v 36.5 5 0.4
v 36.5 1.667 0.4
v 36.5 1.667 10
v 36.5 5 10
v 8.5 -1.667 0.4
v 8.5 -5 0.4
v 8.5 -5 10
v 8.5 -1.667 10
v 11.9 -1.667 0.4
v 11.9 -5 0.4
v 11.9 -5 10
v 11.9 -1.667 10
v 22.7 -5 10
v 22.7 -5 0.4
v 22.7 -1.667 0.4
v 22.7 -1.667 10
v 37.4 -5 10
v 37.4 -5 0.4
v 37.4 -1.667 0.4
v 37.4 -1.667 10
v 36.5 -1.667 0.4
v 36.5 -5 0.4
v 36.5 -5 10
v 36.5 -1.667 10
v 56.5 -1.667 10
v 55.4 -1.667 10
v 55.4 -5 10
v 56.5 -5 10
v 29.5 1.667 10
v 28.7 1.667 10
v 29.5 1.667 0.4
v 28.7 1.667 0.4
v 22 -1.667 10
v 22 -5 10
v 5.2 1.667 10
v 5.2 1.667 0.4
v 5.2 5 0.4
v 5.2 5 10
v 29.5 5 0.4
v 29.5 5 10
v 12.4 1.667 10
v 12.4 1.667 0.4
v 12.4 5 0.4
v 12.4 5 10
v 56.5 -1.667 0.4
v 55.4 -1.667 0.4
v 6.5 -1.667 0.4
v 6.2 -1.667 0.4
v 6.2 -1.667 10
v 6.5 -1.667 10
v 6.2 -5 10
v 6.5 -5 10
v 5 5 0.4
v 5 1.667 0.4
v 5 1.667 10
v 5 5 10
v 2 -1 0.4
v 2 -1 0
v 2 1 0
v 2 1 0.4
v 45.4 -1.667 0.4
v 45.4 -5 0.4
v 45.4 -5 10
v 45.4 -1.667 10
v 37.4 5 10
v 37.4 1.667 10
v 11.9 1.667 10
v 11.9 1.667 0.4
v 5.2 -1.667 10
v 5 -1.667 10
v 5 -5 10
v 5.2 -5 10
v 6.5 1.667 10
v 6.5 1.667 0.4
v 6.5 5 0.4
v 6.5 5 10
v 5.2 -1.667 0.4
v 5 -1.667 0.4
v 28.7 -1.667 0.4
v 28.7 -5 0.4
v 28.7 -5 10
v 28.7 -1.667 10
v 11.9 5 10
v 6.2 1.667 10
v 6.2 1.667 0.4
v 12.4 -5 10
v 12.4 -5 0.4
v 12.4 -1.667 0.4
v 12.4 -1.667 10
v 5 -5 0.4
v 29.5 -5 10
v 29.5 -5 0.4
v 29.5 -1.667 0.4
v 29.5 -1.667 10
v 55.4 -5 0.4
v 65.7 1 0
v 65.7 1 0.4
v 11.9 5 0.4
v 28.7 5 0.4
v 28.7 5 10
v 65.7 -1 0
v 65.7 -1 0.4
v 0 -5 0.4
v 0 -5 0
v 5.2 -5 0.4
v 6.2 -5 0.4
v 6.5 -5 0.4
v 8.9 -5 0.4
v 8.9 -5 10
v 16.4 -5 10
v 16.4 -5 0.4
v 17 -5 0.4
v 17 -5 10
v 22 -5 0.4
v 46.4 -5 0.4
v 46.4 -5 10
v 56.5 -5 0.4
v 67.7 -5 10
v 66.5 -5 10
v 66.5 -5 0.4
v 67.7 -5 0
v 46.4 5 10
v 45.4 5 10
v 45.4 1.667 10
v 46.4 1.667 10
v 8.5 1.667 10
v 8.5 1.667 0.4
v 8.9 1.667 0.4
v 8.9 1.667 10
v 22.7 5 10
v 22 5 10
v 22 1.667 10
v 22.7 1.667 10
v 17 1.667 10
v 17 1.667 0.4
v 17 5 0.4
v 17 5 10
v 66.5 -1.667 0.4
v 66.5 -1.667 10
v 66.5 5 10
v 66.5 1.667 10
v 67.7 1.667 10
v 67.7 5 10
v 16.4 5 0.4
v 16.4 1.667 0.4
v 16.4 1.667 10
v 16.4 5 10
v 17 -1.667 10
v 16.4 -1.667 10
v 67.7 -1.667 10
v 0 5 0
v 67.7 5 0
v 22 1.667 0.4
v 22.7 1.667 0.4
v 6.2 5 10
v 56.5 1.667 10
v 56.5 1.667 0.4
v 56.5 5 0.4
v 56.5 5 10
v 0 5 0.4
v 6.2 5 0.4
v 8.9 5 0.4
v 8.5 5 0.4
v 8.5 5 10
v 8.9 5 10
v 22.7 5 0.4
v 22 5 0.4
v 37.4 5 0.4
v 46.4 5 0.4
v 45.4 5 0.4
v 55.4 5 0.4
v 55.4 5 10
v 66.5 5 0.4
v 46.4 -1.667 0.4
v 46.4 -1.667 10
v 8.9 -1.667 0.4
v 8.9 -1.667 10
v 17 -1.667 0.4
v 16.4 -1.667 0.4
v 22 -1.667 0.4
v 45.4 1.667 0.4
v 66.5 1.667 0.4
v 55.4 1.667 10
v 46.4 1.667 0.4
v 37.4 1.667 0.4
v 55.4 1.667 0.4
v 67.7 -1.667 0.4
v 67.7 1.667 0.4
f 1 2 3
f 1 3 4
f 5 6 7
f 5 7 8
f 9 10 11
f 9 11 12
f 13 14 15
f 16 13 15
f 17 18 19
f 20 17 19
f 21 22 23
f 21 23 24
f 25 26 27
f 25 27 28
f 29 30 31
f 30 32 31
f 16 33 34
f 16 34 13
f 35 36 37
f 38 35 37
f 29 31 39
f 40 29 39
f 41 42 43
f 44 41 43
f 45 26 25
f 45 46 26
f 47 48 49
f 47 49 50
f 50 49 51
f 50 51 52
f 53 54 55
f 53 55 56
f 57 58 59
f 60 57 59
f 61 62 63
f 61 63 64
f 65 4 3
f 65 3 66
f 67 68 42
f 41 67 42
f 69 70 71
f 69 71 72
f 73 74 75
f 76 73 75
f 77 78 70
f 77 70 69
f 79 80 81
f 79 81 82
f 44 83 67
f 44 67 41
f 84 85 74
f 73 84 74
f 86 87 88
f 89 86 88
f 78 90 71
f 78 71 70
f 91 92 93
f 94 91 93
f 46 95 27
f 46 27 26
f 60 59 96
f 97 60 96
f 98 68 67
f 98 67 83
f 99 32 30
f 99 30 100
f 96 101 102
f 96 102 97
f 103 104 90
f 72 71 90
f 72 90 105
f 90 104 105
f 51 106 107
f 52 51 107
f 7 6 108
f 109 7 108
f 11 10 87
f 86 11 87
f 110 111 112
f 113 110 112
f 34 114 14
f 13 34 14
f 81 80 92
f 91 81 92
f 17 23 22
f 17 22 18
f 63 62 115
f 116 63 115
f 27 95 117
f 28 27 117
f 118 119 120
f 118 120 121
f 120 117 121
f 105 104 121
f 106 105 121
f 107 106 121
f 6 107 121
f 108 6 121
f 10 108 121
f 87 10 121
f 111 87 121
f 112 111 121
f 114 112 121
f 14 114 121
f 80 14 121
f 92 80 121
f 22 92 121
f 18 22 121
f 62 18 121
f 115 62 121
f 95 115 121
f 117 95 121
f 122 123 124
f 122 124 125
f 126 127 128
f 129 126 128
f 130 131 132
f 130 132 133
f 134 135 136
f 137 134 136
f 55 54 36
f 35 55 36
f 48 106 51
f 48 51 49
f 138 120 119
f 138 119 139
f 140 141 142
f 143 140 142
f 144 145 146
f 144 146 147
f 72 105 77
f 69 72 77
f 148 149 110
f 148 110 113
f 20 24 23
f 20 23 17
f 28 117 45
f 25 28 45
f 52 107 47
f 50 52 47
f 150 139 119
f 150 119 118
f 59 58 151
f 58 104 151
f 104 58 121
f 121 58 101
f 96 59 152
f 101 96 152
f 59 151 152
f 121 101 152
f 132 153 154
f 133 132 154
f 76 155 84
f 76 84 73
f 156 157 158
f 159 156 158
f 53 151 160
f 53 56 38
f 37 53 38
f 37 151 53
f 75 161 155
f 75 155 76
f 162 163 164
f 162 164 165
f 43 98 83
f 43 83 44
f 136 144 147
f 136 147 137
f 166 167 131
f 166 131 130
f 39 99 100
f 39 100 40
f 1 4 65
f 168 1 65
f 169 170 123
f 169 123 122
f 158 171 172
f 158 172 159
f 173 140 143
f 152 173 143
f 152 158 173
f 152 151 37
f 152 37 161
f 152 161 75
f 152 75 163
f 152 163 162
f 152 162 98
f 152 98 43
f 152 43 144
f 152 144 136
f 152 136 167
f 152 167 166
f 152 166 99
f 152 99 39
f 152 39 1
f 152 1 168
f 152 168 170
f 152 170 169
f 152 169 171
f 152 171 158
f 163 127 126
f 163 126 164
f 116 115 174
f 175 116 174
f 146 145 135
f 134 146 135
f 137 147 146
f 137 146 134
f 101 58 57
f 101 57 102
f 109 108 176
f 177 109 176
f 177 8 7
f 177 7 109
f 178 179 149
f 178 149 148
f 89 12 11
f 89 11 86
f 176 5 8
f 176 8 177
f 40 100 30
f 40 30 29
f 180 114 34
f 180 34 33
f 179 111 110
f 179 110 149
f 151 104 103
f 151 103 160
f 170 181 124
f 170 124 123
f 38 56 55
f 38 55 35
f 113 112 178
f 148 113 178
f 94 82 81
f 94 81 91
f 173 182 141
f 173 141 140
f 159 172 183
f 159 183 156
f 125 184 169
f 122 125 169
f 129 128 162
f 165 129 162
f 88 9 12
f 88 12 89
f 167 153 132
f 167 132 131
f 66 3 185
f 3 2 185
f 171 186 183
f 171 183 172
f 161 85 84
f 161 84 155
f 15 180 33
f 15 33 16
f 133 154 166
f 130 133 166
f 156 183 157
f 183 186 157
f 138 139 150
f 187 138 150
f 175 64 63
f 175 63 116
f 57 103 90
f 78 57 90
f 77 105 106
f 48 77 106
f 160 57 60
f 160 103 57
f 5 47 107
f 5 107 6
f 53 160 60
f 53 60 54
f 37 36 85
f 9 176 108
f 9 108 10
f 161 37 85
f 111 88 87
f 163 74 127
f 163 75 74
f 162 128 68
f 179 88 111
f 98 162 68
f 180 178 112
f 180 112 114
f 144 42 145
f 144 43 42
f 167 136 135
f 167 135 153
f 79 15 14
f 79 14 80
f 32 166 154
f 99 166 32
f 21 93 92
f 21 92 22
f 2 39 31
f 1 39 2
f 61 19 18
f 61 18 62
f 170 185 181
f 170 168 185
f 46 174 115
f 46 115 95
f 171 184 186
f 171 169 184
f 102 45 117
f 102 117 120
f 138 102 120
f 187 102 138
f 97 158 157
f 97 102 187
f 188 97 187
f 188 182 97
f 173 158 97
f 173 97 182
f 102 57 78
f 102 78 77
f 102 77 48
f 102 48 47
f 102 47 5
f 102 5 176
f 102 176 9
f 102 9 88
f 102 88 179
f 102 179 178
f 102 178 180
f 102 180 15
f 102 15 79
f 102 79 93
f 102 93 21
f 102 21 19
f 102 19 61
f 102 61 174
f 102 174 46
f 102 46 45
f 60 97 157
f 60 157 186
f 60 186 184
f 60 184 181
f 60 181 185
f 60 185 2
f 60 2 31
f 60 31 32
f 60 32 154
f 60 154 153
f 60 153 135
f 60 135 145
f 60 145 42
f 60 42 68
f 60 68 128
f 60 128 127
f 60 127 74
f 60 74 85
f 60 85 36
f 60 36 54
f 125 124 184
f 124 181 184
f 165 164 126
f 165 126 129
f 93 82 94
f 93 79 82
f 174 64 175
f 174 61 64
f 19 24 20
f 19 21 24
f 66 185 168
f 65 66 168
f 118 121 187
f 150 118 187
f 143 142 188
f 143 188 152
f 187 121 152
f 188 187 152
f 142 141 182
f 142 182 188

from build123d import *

# Parameters (mm, degrees)
F0_W     = 0.2
F0_H     = 10
F0_W_2   = 0.3
F0_W_3   = 0.4
F0_W_4   = 0.5
F0_W_5   = 0.6
F0_W_6   = 0.7
F0_W_7   = 0.8
F0_W_8   = 0.9
F0_W_9   = 1
F0_W_10  = 1.1
F0_W_11  = 1.2
F1_DEPTH = 10
F2_W     = 67.7
F2_H     = 3.33333
F3_DEPTH = 10.001
F4_W     = 67.7
F4_H     = 10
F4_W_2   = 63.7
F4_H_2   = 2
F5_DEPTH = 0.4


with BuildPart() as f1:
    # F0 (on Top) → F1 (new body)
    with BuildSketch(Plane.XY):
        with Locations((5.1, 0)):
            Rectangle(F0_W, F0_H)
        with Locations((6.35, 0)):
            Rectangle(F0_W_2, F0_H)
        with Locations((8.7, 0)):
            Rectangle(F0_W_3, F0_H)
        with Locations((12.15, 0)):
            Rectangle(F0_W_4, F0_H)
        with Locations((16.7, 0)):
            Rectangle(F0_W_5, F0_H)
        with Locations((22.35, 0)):
            Rectangle(F0_W_6, F0_H)
        with Locations((29.1, 0)):
            Rectangle(F0_W_7, F0_H)
        with Locations((36.95, 0)):
            Rectangle(F0_W_8, F0_H)
        with Locations((45.9, 0)):
            Rectangle(F0_W_9, F0_H)
        with Locations((55.95, 0)):
            Rectangle(F0_W_10, F0_H)
        with Locations((67.1, 0)):
            Rectangle(F0_W_11, F0_H)
    extrude(amount=F1_DEPTH)

    # F2 (on Top) → F3 (cut, through all)
    with BuildSketch(Plane.XY):
        with Locations((33.85, 0)):
            Rectangle(F2_W, F2_H)
    extrude(amount=F3_DEPTH, mode=Mode.SUBTRACT)

    # F4 (on Top) → F5 (join)
    with BuildSketch(Plane.XY):
        with Locations((33.85, 0)):
            Rectangle(F4_W, F4_H)
        with Locations((33.85, 0)):
            Rectangle(F4_W_2, F4_H_2, mode=Mode.SUBTRACT)
    extrude(amount=F5_DEPTH)


solid = f1.part
